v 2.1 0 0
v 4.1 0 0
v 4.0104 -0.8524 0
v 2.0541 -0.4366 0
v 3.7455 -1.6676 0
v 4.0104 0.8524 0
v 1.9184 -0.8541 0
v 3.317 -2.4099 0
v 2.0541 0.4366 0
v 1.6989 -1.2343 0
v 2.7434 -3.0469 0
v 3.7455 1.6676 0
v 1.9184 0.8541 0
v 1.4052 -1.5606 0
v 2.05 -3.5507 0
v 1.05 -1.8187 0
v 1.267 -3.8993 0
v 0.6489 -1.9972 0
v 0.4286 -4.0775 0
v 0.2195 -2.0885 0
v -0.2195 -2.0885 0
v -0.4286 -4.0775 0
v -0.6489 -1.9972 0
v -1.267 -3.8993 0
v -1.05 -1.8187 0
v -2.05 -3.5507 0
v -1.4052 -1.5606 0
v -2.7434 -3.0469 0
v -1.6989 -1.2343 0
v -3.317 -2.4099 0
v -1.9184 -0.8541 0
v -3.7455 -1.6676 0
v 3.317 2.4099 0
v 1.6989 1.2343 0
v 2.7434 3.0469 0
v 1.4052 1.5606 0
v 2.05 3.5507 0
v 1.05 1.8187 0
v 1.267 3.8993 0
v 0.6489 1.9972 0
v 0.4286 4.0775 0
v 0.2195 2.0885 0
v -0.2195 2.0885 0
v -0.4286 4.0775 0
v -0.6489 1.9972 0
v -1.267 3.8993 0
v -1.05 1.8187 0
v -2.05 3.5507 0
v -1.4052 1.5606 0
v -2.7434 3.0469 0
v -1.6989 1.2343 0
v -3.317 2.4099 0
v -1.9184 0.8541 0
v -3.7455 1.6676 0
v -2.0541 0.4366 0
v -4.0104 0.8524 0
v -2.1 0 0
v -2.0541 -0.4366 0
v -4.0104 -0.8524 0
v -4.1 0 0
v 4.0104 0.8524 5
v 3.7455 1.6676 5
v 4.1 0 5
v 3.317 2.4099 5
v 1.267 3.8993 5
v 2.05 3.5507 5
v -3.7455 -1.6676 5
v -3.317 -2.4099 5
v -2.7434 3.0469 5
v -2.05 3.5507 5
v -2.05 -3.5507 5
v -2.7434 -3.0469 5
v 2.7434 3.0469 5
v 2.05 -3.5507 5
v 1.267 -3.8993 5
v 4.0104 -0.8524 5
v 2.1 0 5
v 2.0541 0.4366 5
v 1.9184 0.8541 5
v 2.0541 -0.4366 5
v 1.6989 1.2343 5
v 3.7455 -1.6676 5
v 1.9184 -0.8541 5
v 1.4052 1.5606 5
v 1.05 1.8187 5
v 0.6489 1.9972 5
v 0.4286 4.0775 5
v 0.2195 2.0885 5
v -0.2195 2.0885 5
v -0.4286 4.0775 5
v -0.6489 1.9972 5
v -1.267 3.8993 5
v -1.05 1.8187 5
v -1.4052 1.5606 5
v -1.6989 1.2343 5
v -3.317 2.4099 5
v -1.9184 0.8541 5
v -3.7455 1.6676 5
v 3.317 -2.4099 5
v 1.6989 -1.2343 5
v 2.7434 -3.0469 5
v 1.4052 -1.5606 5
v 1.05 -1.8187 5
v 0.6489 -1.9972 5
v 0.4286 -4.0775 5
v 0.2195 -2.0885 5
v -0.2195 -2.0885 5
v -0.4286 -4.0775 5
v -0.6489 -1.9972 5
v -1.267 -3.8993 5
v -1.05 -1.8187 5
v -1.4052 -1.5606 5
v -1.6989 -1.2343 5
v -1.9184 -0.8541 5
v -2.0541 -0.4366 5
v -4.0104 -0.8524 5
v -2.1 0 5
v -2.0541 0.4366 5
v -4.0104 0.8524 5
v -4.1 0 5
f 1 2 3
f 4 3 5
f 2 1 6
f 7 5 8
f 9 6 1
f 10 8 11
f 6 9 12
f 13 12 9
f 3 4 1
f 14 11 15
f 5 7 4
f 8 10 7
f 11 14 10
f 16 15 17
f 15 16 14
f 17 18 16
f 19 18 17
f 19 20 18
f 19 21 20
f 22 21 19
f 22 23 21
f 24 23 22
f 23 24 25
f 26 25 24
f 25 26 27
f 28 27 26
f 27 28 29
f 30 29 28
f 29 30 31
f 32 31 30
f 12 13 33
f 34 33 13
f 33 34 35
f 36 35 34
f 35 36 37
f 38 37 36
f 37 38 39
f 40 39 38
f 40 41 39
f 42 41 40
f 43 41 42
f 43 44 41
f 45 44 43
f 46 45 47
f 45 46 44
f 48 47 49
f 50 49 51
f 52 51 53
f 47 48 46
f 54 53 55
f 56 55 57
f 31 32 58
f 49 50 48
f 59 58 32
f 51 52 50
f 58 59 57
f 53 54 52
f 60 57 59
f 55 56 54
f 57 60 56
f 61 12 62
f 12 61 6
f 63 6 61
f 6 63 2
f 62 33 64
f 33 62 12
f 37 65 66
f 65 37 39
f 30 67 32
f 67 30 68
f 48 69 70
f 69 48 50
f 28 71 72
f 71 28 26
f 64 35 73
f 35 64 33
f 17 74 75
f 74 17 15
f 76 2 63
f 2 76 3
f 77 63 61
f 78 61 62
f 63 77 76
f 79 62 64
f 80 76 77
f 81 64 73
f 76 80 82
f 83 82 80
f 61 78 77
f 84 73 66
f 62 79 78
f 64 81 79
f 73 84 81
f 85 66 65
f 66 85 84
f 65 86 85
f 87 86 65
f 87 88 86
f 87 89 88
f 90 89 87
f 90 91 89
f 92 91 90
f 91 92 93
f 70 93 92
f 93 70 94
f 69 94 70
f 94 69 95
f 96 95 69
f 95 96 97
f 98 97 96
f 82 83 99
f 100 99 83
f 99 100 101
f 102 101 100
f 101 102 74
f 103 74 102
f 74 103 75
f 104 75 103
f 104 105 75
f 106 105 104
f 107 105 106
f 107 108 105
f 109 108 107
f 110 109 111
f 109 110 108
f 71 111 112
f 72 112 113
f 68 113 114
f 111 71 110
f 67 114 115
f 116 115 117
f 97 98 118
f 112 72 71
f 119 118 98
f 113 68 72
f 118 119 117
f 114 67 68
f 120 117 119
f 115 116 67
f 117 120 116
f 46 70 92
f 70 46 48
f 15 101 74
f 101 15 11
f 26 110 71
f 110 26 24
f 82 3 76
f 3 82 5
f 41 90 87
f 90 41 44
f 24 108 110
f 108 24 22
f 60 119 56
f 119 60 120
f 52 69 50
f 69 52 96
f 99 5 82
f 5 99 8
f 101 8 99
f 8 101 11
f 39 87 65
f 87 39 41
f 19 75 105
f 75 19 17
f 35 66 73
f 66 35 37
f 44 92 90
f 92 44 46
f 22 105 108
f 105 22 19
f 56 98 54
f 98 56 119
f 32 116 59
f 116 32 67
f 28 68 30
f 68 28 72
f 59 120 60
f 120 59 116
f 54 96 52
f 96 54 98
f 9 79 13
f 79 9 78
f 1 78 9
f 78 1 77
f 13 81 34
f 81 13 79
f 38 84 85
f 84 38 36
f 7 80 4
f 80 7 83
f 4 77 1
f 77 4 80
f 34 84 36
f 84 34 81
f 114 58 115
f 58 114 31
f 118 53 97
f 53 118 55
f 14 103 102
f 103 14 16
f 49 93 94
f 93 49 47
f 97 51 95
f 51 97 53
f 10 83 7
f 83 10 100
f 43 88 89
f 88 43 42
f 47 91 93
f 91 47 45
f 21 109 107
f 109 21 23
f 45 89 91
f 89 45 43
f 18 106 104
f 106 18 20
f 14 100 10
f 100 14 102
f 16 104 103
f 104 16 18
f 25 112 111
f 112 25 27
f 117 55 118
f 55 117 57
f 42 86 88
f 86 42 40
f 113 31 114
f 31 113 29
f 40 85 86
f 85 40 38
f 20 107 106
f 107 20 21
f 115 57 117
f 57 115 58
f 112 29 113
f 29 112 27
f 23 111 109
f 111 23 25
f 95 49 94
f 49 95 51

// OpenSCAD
// file: ../lib/utils.scad
///< Utilities

function rand_clr() = rands( 0,1,3 );

///< Length conversions
function in2mm( i ) = ( i * 25.4 ); 
function mm2in( m ) = ( m / 25.4 );

/// This is pulled from stackoverflow
/// https://stackoverflow.com/questions/45826208/openscad-rotating-around-a-particular-point

// rotate as per a, v, but around point pt
module rotate_about_pt(a, v, pt) {
    translate(pt)
        rotate(a,v)
            translate(-pt)
                children();   
}
// file: ../lib/math.scad
///< Math scad module


///< Find the hypotenuse from two sides of a right triangle
function hyp_from_sides( a, b ) = sqrt( pow( a, 2 ) + pow( b, 2 ) );

///< Find equal sides from hypotenuse of a right triangle
function sides_from_hyp(h) = sqrt( pow( h, 2 ) / 2 );

///< Find A from hypotenuse and B
function a_from_hb( h, b ) = sqrt( pow( h, 2 ) - pow( b, 2 ) );

function dist_2d( pt2, pt1 ) = sqrt(pow(( pt2[0]-pt1[0] ),2) + pow(( pt2[1]-pt1[1]),2) );

function mid_pt_2d( pt2, pt1 ) = [( pt1[0]+pt2[0] )/2, ( pt1[1]+pt2[1] )/2, 0 ];
///< Test for math functions

A = 3;
B = 4;
echo("Given A=", A, "and B=", B );
H = hyp_from_sides( A, B );
echo("Hypotenuse=", H );
echo("Calc Correct = ", (H == 5) );

echo("Given H=", H, " which is a hypotenuse with equal sides" );
echo( "the sides=", sides_from_hyp( H ) );

echo("Given H=", H, "B=", 4 );
echo("A=", a_from_hb( H, 4 ) );

echo("Distance from [-1,1] and [3,4] = ", dist_2d( [-1,1],[3,4]) );
// main file
///< Object definition
use <../lib/math.scad>;
use <../lib/utils.scad>;

///< Parameters
height = 5;
outer = 8.2;
inner = 4;

///< Modules
module washer( h, outer_d, inner_d ){
    difference(){
    cylinder( h=h, d=outer_d, $fn=30 );
    translate([0,0,-0.01])
    cylinder( h=h+0.02, d=outer_d-inner_d, $fn=30 );
    }
}

///< Build object
washer( height, outer, inner );
